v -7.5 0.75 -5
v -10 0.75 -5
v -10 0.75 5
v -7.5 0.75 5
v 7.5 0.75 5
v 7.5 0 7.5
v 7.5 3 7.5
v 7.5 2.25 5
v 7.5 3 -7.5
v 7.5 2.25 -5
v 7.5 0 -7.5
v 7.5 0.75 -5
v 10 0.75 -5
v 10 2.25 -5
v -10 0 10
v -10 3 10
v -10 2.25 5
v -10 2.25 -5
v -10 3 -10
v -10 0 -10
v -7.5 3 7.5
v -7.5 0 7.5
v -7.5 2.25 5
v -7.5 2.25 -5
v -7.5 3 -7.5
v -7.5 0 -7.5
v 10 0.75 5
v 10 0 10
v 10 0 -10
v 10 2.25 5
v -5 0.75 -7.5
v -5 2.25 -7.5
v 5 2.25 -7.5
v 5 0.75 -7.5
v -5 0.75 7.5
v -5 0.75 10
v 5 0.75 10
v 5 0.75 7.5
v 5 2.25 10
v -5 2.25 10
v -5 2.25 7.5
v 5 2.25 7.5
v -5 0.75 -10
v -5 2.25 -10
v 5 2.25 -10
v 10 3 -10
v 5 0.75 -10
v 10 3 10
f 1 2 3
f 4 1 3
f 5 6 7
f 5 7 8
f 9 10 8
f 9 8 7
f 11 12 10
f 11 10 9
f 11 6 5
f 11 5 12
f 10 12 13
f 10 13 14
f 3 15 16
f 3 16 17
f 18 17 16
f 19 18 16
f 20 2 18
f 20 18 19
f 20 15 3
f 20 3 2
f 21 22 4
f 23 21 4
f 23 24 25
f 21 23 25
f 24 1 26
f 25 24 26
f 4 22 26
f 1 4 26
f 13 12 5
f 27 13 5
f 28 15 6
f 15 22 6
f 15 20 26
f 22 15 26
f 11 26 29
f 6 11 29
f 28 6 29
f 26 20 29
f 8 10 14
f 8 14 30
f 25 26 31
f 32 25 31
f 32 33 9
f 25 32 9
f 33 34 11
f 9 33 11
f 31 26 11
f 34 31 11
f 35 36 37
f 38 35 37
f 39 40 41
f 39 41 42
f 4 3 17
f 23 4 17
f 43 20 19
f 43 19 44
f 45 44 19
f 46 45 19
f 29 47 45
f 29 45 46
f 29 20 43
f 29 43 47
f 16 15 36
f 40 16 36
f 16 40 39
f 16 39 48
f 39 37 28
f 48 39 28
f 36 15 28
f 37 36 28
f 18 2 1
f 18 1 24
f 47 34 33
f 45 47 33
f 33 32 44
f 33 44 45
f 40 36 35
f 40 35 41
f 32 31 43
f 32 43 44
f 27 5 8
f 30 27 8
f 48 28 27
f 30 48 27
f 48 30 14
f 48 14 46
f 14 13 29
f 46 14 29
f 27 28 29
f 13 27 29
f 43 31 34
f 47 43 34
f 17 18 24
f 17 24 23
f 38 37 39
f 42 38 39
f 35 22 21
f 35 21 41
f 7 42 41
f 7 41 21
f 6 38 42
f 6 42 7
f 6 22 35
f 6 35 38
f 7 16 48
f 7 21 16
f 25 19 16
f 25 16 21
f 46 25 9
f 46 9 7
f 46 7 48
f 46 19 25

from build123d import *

# Parameters (mm, degrees)
SKETCH1_W           = 20
SKETCH1_H           = 20
SKETCH1_W_2         = 15
SKETCH1_H_2         = 15
BOSS_EXTRUDE1_DEPTH = 3
SKETCH2_W           = 10
SKETCH2_H           = 1.5
CUT_EXTRUDE1_DEPTH  = 21
SKETCH3_W           = 10
SKETCH3_H           = 1.5
CUT_EXTRUDE2_DEPTH  = 21


with BuildPart() as part:
    # Sketch1 → Boss-Extrude1 (new body)
    with BuildSketch(Plane(origin=(0, 0, 0), x_dir=(1, 0, 0), z_dir=(0, 1, 0))):
        Rectangle(SKETCH1_W, SKETCH1_H)
        Rectangle(SKETCH1_W_2, SKETCH1_H_2, mode=Mode.SUBTRACT)
    extrude(amount=BOSS_EXTRUDE1_DEPTH)

    # Sketch2 → Cut-Extrude1 (cut, through all)
    with BuildSketch(Plane.XY.offset(10)):
        with Locations((0, 1.5)):
            Rectangle(SKETCH2_W, SKETCH2_H)
    extrude(amount=-CUT_EXTRUDE1_DEPTH, mode=Mode.SUBTRACT)

    # Sketch3 → Cut-Extrude2 (cut, through all)
    with BuildSketch(Plane.ZY.offset(10)):
        with Locations((0, 1.5)):
            Rectangle(SKETCH3_W, SKETCH3_H)
    extrude(amount=-CUT_EXTRUDE2_DEPTH, mode=Mode.SUBTRACT)


solid = part.part
